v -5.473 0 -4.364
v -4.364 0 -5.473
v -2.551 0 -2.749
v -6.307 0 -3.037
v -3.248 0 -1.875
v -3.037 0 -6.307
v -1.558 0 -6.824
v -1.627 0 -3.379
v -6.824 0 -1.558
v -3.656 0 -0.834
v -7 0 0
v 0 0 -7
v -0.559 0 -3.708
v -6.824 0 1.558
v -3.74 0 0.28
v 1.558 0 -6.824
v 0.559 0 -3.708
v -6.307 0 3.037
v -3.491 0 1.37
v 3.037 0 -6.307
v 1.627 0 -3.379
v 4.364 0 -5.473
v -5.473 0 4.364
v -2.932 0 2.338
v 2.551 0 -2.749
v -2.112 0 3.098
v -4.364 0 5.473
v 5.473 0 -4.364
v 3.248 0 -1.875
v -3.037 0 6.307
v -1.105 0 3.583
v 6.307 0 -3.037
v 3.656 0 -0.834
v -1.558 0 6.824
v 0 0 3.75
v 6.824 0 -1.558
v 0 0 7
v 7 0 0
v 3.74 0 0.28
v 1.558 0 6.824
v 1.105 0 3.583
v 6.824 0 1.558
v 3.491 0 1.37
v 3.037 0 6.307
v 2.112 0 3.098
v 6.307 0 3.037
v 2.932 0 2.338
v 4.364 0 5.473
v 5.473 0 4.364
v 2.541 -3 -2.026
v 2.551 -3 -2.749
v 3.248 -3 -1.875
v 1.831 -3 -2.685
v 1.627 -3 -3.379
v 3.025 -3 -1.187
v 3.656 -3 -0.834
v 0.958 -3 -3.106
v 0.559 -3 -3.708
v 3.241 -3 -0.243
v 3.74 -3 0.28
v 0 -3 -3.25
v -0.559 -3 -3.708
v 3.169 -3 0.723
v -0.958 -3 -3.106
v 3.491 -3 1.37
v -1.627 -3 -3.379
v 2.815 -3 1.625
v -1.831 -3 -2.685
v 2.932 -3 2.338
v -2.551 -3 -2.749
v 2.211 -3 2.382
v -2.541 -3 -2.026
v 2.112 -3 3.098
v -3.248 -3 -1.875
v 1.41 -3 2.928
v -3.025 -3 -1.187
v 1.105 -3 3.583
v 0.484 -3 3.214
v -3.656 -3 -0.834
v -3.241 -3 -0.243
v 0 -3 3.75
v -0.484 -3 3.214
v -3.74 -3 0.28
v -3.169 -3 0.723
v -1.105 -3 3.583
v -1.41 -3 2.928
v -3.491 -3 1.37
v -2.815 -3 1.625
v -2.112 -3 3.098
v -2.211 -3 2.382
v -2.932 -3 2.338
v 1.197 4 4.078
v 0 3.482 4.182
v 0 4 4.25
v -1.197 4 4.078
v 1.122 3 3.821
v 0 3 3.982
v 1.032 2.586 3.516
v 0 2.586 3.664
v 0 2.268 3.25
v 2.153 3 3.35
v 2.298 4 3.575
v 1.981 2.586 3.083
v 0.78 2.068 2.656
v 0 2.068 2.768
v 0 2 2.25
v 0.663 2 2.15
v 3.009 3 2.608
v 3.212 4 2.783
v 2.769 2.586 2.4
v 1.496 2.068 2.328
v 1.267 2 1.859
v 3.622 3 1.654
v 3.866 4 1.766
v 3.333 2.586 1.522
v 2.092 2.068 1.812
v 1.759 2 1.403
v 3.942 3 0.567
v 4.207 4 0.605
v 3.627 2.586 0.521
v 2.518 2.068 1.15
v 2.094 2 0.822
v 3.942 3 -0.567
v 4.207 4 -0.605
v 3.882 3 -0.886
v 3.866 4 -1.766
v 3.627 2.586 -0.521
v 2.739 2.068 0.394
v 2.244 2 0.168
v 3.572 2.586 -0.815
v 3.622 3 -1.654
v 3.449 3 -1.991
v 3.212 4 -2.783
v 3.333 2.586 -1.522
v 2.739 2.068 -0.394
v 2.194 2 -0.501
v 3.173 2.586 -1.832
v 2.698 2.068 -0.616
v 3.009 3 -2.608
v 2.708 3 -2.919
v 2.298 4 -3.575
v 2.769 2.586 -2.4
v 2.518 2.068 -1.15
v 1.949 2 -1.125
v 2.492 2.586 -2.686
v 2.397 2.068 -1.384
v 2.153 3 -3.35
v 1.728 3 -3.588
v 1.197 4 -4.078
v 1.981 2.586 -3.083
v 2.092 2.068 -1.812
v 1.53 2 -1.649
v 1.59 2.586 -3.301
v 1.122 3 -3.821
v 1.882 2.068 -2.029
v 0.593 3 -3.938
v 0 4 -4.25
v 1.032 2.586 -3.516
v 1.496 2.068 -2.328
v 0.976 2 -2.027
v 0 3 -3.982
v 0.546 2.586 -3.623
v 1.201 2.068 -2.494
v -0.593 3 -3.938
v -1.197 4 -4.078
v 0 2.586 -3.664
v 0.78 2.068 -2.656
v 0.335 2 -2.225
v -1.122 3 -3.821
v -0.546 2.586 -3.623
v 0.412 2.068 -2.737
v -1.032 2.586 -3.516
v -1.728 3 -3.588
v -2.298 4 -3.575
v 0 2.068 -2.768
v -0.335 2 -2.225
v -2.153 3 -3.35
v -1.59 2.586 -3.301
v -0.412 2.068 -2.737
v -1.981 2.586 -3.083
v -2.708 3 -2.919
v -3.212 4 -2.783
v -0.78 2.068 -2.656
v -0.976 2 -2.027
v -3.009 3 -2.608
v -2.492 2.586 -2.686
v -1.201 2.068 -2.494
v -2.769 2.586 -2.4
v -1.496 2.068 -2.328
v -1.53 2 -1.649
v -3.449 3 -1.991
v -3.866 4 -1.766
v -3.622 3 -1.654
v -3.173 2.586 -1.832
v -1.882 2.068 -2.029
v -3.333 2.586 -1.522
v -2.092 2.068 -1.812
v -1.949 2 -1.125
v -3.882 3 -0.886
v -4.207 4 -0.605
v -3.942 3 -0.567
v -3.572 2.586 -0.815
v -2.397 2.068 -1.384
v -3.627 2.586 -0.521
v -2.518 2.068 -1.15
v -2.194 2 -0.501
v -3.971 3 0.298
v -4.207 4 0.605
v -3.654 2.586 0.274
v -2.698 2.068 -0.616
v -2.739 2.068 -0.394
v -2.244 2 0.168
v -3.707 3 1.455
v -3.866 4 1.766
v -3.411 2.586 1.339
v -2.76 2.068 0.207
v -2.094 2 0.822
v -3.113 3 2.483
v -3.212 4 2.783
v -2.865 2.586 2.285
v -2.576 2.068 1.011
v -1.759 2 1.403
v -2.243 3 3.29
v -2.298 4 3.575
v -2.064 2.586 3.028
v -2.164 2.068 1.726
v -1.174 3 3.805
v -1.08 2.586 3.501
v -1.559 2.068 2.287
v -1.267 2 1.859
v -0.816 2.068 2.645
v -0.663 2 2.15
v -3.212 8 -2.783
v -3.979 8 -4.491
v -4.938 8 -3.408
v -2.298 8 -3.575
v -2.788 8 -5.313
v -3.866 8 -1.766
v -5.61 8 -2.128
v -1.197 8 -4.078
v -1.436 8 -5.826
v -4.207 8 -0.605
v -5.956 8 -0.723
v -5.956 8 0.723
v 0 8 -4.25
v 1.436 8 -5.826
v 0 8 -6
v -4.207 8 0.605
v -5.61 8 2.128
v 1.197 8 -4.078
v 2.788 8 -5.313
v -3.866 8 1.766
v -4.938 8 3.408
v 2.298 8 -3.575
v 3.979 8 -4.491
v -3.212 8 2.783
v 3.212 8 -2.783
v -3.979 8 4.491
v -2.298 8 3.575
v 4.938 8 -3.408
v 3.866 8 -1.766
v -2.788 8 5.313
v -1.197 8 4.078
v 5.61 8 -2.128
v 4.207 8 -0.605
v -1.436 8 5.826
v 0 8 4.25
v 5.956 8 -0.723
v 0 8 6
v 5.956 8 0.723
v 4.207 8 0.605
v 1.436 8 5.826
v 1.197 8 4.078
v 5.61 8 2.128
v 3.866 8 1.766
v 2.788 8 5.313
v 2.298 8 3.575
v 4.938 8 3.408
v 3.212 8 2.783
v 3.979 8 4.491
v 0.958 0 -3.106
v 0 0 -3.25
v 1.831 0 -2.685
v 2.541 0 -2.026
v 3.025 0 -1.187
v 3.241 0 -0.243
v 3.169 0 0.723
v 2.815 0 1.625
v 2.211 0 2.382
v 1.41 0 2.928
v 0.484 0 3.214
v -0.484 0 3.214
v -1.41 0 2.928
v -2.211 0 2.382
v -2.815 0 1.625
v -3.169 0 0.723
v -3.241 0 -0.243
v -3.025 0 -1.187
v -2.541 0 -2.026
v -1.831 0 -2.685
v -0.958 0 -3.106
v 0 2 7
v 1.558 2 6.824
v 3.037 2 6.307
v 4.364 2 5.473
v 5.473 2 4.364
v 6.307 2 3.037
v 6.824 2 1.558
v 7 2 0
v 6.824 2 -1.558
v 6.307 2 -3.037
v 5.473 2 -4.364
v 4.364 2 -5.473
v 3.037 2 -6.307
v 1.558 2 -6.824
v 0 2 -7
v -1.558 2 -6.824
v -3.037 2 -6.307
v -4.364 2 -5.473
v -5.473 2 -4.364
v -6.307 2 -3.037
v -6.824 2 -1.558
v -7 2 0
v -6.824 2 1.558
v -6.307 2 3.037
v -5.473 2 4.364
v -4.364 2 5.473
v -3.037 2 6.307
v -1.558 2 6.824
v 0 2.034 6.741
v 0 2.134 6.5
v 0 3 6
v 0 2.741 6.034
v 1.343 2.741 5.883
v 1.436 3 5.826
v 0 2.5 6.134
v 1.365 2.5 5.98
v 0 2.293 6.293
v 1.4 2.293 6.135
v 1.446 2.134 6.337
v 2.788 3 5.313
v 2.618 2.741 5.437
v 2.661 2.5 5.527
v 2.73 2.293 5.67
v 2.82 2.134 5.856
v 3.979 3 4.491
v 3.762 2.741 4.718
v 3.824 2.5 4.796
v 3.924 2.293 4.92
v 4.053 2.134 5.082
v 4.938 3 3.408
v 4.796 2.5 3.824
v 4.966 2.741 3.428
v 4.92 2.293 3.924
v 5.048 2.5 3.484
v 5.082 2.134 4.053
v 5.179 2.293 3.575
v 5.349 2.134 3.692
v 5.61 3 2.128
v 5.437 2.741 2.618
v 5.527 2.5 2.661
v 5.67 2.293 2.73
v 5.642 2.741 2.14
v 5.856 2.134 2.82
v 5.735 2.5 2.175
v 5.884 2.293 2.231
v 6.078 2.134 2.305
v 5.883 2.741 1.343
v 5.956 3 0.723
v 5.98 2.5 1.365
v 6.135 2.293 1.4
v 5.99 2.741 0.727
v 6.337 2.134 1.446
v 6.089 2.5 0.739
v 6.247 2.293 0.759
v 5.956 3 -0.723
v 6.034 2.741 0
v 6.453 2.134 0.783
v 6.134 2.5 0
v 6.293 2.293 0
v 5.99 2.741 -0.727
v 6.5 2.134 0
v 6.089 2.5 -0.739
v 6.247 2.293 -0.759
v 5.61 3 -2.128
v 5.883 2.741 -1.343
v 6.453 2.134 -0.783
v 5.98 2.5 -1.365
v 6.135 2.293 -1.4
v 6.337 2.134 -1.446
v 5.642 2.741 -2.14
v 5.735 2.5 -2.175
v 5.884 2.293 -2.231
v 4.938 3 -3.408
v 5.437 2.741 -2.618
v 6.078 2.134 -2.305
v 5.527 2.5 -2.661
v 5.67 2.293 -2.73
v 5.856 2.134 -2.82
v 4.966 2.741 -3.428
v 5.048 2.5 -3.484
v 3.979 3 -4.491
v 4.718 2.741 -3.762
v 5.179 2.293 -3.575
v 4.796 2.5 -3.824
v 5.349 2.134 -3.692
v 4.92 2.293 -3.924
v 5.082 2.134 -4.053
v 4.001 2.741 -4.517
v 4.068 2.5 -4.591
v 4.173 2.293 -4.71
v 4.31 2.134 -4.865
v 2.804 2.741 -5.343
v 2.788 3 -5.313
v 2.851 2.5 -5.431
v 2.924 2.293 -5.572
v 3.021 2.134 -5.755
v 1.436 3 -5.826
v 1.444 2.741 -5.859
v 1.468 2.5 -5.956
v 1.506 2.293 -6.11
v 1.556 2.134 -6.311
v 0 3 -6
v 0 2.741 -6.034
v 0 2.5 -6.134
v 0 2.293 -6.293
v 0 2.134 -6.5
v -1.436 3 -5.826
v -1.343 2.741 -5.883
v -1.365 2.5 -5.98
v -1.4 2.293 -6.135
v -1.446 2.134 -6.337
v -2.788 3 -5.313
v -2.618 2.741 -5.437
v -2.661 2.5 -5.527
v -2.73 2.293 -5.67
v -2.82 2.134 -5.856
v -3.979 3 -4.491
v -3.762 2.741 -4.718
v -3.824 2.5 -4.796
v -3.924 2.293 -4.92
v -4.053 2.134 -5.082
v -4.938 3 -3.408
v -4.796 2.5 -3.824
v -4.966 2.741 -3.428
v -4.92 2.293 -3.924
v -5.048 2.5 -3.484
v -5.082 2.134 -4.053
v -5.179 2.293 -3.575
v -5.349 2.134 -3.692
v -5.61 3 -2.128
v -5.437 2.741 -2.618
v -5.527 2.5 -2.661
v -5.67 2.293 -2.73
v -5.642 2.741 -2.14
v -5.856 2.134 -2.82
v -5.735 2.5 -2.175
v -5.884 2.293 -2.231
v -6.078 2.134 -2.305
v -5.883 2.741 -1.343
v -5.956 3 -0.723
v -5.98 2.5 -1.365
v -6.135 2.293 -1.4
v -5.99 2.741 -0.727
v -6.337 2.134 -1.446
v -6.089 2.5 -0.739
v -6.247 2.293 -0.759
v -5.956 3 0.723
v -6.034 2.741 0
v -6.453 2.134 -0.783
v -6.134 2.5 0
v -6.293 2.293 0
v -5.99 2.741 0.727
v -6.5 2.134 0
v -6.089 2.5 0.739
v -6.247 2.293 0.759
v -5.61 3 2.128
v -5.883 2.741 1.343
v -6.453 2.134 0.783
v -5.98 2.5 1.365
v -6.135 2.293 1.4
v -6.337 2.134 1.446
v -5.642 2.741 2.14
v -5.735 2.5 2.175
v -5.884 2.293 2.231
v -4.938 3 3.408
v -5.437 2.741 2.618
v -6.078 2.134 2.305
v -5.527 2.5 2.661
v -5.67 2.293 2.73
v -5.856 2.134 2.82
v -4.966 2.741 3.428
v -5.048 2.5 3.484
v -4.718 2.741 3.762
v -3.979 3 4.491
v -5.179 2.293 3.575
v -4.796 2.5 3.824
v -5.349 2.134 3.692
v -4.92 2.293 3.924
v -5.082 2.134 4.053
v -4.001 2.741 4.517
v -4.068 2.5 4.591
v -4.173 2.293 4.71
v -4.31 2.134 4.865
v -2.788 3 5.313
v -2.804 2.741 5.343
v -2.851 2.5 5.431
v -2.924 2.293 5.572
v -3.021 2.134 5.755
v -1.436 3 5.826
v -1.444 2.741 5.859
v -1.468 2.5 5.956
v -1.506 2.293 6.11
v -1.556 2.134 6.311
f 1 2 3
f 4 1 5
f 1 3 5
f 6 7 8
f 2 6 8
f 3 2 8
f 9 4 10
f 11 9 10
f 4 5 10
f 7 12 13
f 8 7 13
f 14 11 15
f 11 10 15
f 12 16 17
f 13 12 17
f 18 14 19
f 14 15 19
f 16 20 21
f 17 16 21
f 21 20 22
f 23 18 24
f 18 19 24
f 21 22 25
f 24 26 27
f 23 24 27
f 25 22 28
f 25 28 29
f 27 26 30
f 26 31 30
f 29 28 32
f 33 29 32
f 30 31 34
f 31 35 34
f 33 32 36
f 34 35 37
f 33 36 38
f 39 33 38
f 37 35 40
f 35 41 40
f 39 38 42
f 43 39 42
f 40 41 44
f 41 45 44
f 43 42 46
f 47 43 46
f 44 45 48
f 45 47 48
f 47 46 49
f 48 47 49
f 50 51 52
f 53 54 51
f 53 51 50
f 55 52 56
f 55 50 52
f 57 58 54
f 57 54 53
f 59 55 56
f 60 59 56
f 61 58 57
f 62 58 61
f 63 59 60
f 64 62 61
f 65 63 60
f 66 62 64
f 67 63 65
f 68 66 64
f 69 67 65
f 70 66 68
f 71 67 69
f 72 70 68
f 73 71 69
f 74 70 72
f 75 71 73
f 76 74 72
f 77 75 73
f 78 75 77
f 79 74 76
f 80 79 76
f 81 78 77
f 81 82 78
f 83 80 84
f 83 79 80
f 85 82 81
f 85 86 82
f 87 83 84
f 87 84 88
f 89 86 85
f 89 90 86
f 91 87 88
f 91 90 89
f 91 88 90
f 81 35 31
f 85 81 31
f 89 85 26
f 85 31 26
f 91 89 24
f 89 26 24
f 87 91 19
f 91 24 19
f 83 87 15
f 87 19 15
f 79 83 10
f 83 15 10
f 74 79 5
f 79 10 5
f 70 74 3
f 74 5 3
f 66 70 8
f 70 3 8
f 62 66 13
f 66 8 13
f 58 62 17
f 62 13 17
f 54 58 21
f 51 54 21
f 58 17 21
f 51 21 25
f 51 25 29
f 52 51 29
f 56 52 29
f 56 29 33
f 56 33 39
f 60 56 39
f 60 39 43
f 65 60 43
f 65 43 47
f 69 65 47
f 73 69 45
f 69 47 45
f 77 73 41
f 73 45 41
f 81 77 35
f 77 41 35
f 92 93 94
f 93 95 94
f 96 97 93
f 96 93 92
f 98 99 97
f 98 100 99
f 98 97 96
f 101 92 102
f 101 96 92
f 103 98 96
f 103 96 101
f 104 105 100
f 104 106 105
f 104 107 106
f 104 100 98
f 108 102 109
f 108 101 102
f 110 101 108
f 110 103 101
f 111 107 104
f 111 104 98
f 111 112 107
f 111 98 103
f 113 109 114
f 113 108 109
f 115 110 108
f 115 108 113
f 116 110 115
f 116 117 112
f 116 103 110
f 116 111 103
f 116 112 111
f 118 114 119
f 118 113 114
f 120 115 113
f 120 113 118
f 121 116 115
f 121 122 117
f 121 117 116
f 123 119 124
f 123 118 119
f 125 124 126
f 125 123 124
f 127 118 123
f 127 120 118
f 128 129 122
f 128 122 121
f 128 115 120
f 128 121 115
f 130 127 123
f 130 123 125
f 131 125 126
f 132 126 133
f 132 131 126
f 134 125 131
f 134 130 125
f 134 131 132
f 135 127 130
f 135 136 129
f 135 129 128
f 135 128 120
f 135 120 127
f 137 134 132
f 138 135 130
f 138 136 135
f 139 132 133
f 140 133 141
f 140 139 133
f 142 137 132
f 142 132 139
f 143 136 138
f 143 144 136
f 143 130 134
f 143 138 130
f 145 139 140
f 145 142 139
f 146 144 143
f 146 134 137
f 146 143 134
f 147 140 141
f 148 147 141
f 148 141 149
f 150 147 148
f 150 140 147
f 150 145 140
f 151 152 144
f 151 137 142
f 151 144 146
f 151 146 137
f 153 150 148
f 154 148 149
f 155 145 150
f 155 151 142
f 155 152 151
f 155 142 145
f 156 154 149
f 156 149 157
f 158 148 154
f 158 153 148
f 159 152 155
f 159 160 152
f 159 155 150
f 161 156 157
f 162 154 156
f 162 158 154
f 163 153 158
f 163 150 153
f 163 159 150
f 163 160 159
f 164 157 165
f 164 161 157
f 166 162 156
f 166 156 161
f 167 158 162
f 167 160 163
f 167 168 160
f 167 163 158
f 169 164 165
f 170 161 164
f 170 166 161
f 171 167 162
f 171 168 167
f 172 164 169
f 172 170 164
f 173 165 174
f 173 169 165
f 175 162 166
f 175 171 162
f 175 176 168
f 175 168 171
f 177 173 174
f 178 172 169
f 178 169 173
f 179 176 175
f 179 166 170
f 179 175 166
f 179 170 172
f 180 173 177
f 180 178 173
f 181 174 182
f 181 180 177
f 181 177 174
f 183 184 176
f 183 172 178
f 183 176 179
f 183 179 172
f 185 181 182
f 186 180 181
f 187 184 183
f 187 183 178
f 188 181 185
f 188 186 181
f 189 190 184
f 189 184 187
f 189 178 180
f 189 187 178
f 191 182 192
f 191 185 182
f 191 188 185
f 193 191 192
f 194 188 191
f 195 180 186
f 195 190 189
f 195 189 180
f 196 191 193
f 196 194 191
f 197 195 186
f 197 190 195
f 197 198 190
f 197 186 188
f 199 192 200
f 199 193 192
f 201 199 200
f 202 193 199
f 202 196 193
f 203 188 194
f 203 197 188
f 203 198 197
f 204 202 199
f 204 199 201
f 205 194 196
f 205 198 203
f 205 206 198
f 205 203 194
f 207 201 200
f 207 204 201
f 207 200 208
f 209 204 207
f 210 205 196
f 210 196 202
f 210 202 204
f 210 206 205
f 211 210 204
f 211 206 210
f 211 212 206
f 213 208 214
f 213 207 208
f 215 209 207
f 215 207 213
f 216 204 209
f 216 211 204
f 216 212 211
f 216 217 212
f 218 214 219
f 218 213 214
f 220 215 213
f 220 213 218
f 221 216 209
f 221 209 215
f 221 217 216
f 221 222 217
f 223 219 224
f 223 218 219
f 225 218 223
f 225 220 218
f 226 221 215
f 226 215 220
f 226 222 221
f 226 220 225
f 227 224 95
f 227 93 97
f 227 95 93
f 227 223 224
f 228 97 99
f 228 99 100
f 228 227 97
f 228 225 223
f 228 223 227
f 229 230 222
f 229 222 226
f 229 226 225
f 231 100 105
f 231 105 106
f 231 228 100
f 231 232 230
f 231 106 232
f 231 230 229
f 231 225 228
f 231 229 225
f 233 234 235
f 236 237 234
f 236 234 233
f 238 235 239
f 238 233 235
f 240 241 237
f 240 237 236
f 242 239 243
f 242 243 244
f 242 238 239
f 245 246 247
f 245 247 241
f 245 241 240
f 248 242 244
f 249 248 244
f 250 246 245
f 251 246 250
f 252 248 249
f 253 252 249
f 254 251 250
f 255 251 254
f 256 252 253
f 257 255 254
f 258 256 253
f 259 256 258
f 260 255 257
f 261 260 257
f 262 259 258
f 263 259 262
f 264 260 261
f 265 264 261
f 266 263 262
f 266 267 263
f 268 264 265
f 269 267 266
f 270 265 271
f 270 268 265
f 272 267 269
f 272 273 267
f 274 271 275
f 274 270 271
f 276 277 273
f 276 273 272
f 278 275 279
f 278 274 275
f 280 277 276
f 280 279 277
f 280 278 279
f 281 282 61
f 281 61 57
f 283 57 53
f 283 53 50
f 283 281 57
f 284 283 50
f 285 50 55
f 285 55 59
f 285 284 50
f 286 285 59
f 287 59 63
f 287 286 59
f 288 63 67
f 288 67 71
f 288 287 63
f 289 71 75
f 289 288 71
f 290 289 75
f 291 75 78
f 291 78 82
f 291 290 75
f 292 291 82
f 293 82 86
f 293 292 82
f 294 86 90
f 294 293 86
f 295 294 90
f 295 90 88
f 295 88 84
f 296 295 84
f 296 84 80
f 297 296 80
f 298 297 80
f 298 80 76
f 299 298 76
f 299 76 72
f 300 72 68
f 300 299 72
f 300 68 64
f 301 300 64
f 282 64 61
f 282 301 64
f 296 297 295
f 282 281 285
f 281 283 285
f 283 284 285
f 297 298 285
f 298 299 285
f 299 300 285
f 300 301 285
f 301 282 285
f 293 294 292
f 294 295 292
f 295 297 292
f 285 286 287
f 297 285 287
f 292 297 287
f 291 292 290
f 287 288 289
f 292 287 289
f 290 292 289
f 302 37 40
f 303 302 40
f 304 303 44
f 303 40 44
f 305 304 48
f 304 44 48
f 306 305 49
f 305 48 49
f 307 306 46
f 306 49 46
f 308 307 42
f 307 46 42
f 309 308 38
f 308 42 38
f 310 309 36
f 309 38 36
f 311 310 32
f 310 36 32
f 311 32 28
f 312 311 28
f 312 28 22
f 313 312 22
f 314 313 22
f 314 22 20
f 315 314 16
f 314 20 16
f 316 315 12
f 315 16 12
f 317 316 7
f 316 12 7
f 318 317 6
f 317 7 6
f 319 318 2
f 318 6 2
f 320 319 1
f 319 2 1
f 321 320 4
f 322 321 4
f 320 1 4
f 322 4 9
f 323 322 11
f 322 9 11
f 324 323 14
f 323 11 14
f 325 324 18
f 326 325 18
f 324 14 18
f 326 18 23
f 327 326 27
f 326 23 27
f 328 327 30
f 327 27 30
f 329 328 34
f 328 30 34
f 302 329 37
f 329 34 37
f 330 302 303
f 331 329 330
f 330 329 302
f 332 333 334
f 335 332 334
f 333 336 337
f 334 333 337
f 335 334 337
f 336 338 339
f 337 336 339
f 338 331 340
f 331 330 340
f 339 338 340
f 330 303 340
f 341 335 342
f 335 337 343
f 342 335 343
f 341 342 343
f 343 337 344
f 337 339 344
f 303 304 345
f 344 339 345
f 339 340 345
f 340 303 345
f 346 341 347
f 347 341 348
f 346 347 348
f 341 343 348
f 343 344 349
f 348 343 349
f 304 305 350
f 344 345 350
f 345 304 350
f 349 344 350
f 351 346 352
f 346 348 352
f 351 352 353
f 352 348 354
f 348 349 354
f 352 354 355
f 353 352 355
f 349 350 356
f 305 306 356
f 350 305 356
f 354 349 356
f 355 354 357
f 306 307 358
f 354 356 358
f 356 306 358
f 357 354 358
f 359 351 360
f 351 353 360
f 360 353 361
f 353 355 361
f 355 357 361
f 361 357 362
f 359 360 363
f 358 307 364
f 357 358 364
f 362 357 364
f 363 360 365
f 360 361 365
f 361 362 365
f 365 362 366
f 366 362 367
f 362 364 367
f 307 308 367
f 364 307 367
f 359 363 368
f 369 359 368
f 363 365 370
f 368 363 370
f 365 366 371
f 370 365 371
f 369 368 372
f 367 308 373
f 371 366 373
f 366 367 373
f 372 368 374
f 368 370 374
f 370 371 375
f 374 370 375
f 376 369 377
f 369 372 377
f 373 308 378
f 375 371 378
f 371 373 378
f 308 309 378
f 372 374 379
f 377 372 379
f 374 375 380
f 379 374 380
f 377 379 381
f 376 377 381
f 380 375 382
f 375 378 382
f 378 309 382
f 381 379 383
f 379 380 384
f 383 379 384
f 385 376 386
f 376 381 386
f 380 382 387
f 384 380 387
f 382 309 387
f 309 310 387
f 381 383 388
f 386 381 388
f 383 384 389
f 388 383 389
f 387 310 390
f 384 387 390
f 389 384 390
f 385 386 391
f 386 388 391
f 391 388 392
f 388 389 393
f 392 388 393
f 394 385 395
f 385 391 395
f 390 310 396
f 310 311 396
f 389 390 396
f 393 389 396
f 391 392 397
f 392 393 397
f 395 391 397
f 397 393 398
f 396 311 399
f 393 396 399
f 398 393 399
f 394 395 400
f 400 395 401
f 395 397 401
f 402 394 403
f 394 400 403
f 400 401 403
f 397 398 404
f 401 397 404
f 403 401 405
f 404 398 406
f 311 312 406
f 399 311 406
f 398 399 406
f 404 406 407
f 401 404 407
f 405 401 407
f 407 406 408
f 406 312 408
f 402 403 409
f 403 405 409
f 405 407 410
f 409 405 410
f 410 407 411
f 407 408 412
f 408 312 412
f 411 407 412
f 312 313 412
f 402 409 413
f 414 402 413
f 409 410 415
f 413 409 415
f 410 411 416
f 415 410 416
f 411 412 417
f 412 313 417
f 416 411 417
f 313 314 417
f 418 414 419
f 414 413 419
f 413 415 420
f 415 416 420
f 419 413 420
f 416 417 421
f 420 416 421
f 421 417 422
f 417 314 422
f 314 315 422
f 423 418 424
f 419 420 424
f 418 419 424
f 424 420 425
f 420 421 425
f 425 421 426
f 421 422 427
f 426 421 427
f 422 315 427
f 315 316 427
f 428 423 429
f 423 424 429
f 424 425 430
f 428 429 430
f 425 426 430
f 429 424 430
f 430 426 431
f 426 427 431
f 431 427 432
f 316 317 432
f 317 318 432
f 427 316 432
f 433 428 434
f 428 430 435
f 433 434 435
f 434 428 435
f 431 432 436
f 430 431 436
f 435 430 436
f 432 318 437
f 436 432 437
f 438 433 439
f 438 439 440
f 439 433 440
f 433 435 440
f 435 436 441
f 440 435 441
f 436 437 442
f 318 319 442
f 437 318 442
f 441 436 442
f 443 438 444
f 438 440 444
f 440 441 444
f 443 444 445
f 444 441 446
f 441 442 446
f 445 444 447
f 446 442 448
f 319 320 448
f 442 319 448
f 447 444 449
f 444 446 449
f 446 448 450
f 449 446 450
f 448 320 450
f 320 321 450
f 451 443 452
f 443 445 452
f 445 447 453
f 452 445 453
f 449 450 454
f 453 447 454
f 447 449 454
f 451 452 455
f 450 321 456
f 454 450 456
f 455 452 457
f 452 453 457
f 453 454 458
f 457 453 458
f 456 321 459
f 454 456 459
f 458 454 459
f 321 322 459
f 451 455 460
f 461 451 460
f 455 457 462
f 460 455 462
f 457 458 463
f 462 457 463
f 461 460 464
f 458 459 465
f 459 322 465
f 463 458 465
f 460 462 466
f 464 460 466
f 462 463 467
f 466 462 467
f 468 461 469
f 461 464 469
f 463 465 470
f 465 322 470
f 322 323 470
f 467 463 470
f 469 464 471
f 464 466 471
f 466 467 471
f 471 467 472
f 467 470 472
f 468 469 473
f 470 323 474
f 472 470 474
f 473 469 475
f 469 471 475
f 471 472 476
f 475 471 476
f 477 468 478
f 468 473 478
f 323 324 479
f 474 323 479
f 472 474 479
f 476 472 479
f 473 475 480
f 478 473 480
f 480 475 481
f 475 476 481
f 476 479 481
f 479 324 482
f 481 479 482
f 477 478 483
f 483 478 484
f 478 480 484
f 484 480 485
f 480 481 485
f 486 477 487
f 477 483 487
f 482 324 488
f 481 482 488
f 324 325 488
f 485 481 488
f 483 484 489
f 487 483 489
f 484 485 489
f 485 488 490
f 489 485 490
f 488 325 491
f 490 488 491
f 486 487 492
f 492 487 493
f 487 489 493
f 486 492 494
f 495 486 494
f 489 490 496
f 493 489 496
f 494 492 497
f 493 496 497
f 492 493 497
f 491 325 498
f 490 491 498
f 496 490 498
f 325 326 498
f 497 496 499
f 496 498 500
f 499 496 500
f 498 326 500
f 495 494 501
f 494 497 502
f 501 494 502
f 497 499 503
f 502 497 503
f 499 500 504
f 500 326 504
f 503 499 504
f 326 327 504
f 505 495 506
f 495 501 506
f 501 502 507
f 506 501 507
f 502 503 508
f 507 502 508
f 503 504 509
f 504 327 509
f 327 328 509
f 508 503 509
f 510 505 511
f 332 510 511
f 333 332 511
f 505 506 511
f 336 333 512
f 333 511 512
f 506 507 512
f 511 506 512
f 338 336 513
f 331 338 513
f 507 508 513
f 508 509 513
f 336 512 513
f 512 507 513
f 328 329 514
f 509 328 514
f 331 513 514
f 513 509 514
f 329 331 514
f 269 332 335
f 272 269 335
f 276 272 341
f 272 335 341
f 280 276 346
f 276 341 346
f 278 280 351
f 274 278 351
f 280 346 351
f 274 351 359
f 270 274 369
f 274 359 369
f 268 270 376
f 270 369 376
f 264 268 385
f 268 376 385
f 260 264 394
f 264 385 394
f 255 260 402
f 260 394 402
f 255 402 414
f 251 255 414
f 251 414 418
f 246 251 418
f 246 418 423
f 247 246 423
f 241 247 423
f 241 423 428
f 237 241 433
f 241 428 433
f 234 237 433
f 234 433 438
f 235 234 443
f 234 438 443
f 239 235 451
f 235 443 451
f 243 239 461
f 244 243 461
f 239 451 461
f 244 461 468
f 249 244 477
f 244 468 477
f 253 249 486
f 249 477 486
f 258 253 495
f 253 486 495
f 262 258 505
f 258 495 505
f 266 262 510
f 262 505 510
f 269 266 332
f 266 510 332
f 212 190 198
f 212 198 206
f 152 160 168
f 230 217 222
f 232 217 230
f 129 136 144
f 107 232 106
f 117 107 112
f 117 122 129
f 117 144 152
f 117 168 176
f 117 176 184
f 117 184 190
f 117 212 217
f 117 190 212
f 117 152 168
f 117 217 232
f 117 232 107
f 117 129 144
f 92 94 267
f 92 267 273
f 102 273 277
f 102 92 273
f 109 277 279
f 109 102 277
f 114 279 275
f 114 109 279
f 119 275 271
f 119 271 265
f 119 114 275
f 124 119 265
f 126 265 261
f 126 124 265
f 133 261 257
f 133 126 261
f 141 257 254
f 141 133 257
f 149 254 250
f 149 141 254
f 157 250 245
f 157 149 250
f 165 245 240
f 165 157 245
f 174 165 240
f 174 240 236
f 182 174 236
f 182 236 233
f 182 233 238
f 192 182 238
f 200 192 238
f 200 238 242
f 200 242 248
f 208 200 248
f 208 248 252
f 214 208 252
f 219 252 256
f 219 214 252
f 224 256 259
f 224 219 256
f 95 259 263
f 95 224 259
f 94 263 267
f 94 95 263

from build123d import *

# Parameters (mm, degrees)
CROQUIS1_R              = 7
SALIENTE_EXTRUIR1_DEPTH = 2
CROQUIS2_R              = 6
CROQUIS2_R_2            = 4.25
SALIENTE_EXTRUIR2_DEPTH = 6
REDONDEO3_R             = 2
REDONDEO4_R             = 1
CROQUIS3_R              = 3.75
CROQUIS3_R_2            = 3.25
SALIENTE_EXTRUIR3_DEPTH = 3


with BuildPart() as part:
    # Croquis1 → Saliente-Extruir1 (new body)
    with BuildSketch(Plane(origin=(0, 0, 0), x_dir=(1, 0, 0), z_dir=(0, 1, 0))):
        with Locations(Location((0, 0, 0), (0, 0, 270))):
            Circle(CROQUIS1_R)
    extrude(amount=SALIENTE_EXTRUIR1_DEPTH)

    # Croquis2 → Saliente-Extruir2 (add)
    with BuildSketch(Plane(origin=(0, 2, 0), x_dir=(1, 0, 0), z_dir=(0, 1, 0))):
        with Locations(Location((0, 0, 0), (0, 0, 270))):
            Circle(CROQUIS2_R)
        with Locations(Location((0, 0, 0), (0, 0, 270))):
            Circle(CROQUIS2_R_2, mode=Mode.SUBTRACT)
    extrude(amount=SALIENTE_EXTRUIR2_DEPTH)

    # Redondeo3
    redondeo3_edges = [part.edges().sort_by_distance(p)[0] for p in [
        (0, 2, -4.25),
    ]]
    fillet(redondeo3_edges, radius=REDONDEO3_R)

    # Redondeo4
    redondeo4_edges = [part.edges().sort_by_distance(p)[0] for p in [
        (0, 2, -6),
    ]]
    fillet(redondeo4_edges, radius=REDONDEO4_R - 0.0001)  # a hair under: the kernel refuses the full size

    # Croquis3 → Saliente-Extruir3 (add)
    with BuildSketch(Plane.XZ):
        with Locations(Location((0, 0, 0), (0, 0, 90))):
            Circle(CROQUIS3_R)
        with Locations(Location((0, 0, 0), (0, 0, 270))):
            Circle(CROQUIS3_R_2, mode=Mode.SUBTRACT)
    extrude(amount=SALIENTE_EXTRUIR3_DEPTH)


solid = part.part
